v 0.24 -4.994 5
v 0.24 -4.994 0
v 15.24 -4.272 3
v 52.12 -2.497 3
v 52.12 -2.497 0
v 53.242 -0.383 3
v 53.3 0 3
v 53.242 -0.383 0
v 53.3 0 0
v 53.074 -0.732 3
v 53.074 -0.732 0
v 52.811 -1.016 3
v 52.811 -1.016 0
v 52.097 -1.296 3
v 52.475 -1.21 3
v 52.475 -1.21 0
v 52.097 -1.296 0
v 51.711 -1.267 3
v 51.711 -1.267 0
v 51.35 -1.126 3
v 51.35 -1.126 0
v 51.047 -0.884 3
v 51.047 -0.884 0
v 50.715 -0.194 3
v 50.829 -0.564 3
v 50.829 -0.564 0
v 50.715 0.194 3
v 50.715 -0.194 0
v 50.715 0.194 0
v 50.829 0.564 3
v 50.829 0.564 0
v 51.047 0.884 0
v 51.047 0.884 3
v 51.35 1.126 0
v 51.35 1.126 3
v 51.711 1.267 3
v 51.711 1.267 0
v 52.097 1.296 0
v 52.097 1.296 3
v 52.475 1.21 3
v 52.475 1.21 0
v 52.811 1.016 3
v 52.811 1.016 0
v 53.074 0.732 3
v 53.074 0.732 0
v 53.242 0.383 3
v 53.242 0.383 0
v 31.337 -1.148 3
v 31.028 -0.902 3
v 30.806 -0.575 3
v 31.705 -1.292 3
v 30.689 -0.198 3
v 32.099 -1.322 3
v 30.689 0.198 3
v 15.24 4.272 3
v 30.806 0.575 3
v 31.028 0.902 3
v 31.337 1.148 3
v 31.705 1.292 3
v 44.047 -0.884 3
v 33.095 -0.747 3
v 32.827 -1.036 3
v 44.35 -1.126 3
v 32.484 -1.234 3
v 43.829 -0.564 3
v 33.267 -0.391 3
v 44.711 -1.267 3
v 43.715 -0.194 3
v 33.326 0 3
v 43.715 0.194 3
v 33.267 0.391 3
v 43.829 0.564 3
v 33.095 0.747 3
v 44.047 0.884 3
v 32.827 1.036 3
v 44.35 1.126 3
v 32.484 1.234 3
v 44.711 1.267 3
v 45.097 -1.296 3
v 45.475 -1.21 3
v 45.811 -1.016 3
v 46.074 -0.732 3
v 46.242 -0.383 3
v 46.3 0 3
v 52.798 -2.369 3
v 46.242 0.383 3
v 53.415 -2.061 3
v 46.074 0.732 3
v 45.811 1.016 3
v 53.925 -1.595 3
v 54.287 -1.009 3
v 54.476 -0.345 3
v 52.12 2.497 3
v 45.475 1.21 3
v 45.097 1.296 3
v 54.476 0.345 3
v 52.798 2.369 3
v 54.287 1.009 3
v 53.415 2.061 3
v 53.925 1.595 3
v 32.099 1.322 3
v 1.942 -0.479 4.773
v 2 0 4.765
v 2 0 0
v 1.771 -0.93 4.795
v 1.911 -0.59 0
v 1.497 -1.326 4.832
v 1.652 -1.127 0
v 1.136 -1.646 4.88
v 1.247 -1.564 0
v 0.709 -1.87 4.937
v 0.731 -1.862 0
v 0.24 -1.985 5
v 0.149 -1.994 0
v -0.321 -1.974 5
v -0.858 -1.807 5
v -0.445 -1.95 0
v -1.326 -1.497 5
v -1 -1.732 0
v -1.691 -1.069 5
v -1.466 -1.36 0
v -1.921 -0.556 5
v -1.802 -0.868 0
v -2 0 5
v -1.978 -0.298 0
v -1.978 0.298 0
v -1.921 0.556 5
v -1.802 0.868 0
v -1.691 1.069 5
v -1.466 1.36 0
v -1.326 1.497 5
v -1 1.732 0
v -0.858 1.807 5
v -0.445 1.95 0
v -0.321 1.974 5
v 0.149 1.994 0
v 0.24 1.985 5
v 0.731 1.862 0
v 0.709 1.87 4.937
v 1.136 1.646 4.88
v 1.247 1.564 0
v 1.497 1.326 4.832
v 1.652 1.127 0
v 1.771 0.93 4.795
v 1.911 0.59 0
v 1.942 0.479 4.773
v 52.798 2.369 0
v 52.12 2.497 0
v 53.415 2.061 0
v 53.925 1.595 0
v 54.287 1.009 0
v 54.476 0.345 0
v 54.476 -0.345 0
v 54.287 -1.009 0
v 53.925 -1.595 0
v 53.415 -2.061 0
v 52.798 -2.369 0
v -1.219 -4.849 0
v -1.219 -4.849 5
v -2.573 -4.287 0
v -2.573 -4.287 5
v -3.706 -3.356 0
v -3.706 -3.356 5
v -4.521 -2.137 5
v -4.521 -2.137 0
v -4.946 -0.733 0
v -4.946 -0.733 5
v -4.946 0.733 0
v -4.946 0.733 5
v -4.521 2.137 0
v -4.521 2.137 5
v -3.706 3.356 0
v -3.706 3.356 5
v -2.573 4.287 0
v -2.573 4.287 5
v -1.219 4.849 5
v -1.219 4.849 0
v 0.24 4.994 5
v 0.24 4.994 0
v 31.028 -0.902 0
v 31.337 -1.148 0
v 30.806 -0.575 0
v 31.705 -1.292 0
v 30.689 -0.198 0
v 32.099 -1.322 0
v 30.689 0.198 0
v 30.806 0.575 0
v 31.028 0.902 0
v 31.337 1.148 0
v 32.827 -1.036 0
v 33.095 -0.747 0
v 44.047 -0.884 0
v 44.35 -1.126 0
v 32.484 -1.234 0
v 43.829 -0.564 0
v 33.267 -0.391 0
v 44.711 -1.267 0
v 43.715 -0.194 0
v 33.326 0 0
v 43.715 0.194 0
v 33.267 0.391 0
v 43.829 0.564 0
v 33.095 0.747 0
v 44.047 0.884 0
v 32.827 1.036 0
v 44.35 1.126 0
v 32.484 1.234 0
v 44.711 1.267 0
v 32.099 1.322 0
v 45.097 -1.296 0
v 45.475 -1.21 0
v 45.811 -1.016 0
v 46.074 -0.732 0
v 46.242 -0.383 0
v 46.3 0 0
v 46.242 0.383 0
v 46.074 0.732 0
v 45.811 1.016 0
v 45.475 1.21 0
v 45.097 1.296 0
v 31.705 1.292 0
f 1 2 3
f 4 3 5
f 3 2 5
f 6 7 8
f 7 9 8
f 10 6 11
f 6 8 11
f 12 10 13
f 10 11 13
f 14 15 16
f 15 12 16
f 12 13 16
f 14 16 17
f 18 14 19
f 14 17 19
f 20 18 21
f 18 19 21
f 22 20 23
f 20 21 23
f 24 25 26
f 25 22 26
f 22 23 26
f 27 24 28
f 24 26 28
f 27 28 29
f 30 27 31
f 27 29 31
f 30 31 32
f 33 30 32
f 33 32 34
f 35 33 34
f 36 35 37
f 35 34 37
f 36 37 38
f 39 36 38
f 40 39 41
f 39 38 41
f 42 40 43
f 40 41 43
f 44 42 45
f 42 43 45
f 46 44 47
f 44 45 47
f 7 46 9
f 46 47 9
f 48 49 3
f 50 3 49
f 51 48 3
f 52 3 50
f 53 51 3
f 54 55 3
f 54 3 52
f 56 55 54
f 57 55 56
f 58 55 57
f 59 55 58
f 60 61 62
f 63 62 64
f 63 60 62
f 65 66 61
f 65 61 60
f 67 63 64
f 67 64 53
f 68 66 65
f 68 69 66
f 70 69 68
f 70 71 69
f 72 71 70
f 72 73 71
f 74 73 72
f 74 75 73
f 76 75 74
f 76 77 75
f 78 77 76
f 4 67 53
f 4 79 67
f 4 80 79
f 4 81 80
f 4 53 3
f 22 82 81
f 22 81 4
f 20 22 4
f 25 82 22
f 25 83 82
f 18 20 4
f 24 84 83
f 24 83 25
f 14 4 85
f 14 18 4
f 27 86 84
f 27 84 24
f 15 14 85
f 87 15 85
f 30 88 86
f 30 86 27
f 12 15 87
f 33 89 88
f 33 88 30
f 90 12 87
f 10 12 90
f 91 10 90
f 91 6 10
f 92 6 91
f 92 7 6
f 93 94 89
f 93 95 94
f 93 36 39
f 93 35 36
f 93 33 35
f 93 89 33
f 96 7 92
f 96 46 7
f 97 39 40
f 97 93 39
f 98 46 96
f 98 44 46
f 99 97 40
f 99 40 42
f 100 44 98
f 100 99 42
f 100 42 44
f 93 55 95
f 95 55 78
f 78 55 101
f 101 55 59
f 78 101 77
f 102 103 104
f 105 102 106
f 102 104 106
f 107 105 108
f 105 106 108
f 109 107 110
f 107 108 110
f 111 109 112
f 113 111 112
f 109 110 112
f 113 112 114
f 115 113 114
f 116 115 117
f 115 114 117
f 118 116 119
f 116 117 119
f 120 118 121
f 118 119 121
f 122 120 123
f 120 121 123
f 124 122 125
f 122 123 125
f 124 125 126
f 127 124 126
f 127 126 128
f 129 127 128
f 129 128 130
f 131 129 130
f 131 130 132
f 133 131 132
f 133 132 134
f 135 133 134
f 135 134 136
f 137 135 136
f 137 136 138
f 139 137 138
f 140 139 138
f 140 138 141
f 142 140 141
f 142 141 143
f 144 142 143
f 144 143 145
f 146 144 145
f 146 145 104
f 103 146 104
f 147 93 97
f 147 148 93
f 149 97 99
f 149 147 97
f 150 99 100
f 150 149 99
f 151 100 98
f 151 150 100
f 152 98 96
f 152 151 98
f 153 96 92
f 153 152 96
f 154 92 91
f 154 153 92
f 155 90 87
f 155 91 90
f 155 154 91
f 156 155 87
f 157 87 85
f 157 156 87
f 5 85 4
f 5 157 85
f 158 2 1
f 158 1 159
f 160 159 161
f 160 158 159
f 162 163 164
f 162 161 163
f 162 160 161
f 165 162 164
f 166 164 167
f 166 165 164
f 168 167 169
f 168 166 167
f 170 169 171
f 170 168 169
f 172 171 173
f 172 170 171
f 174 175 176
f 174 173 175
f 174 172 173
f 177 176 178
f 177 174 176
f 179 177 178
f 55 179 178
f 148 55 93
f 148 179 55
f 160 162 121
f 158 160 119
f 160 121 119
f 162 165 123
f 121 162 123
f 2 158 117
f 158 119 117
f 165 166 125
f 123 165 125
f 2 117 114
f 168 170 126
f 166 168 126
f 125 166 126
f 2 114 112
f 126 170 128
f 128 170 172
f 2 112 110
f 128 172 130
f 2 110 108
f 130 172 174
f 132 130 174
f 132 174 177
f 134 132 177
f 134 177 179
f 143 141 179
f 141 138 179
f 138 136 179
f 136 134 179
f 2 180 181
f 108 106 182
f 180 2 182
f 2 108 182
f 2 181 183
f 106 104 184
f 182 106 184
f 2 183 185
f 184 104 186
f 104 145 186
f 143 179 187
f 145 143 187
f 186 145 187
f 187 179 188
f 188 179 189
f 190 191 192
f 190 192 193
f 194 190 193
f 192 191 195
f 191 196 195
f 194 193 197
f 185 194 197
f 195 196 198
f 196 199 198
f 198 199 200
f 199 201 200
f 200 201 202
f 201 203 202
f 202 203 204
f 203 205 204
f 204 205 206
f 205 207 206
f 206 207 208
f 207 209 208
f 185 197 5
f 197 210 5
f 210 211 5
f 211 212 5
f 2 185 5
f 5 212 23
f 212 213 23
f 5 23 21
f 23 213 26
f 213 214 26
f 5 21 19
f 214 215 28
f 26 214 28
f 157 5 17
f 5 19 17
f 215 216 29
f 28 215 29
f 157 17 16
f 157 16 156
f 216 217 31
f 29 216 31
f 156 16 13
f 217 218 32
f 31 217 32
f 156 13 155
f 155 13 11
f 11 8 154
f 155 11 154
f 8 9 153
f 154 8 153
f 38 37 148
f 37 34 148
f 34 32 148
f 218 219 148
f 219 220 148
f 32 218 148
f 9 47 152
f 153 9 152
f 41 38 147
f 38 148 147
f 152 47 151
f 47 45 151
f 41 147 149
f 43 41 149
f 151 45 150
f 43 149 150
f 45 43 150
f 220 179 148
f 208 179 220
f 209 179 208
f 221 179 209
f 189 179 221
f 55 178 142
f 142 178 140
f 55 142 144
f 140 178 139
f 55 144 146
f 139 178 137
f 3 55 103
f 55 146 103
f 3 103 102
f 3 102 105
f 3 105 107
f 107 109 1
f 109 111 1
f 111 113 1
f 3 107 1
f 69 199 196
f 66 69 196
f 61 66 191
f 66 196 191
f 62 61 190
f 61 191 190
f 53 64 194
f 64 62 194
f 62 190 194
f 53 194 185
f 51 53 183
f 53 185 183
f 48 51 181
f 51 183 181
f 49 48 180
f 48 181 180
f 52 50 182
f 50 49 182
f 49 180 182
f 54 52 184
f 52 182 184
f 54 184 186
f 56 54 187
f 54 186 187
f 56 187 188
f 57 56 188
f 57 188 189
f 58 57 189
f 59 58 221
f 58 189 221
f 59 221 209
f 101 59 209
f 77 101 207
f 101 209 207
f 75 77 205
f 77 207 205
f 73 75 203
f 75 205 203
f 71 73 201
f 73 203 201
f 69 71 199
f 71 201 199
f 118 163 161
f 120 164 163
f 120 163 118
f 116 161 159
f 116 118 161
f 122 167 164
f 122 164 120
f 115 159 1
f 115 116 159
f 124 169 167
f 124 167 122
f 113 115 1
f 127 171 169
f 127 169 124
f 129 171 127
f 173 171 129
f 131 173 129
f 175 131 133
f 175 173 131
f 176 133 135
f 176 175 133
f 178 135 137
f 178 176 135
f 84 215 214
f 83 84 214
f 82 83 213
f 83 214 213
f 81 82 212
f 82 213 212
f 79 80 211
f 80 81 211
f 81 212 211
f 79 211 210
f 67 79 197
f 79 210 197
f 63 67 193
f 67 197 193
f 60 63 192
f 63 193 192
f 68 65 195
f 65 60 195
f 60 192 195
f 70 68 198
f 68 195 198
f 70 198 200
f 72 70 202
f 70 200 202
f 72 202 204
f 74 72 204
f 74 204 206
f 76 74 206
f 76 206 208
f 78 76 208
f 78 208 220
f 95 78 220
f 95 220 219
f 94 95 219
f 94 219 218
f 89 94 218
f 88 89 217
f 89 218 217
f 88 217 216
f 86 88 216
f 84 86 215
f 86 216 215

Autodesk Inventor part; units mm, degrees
ref_plane "YZ Plane" through (0, 0, 0) normal (1, 0, 0) x (0, 1, 0)
ref_plane "XZ Plane" through (0, 0, 0) normal (0, 1, 0) x (-1, 0, 0)
ref_plane "XY Plane" through (0, 0, 0) normal (0, 0, 1) x (1, 0, 0)
sketch "Skizze1" plane through (0, 0, 0) normal (0, 0, 1) x (1, 0, 0)
  line L0 (0, 7) -> (0, -7) construction
  line L1 (-16.9, 0) -> (66.4, 0) construction
  circle A0 centre (0, 0) radius 2
  circle A1 centre (32, 0) radius 1.3257
  circle A2 centre (45, 0) radius 1.3
  circle A3 centre (52, 0) radius 1.3
  arc A4 (52.1202, -2.4971) -> (52.1202, 2.4971) centre (52, 0) ccw
  arc A5 (0.2404, 4.9942) -> (0.2404, -4.9942) centre (0, 0) ccw
  line L2 (0.2404, 4.9942) -> (52.1202, 2.4971)
  line L3 (0.2404, -4.9942) -> (52.1202, -2.4971)
  line L4 (0.2404, -4.9942) -> (0.2404, -1.9855)
  line L5 (0.2404, 1.9855) -> (0.2404, 4.9942)
  line L6 (0.2404, 1.9855) -> (0.2404, -1.9855)
  dimension "d0" = 32
  dimension "d1" = 45
  dimension "d2" = 52
  dimension "d3" = 5
  dimension "d4" = 2.6
  dimension "d5" = 4
  dimension "d6" = 10
extrude "Extrusion1" add sketch "Skizze1" along normal blind 3
extrude "Extrusion2" add sketch "Skizze1" along normal blind 5 contours L6 A0 | A0 L4 A5 L5 picked at (-1.282, 0.0747)
chamfer "Fase1" distance 15 distance2 2 1 edges at (0.2404, 0, 3) measured on face at (10.385, 0, 3)
extrude "Extrusion3" cut sketch "Skizze1" along normal blind 5 contours A0 L6 | L6 A0
properties part number "Servo-Arm-52mm"
